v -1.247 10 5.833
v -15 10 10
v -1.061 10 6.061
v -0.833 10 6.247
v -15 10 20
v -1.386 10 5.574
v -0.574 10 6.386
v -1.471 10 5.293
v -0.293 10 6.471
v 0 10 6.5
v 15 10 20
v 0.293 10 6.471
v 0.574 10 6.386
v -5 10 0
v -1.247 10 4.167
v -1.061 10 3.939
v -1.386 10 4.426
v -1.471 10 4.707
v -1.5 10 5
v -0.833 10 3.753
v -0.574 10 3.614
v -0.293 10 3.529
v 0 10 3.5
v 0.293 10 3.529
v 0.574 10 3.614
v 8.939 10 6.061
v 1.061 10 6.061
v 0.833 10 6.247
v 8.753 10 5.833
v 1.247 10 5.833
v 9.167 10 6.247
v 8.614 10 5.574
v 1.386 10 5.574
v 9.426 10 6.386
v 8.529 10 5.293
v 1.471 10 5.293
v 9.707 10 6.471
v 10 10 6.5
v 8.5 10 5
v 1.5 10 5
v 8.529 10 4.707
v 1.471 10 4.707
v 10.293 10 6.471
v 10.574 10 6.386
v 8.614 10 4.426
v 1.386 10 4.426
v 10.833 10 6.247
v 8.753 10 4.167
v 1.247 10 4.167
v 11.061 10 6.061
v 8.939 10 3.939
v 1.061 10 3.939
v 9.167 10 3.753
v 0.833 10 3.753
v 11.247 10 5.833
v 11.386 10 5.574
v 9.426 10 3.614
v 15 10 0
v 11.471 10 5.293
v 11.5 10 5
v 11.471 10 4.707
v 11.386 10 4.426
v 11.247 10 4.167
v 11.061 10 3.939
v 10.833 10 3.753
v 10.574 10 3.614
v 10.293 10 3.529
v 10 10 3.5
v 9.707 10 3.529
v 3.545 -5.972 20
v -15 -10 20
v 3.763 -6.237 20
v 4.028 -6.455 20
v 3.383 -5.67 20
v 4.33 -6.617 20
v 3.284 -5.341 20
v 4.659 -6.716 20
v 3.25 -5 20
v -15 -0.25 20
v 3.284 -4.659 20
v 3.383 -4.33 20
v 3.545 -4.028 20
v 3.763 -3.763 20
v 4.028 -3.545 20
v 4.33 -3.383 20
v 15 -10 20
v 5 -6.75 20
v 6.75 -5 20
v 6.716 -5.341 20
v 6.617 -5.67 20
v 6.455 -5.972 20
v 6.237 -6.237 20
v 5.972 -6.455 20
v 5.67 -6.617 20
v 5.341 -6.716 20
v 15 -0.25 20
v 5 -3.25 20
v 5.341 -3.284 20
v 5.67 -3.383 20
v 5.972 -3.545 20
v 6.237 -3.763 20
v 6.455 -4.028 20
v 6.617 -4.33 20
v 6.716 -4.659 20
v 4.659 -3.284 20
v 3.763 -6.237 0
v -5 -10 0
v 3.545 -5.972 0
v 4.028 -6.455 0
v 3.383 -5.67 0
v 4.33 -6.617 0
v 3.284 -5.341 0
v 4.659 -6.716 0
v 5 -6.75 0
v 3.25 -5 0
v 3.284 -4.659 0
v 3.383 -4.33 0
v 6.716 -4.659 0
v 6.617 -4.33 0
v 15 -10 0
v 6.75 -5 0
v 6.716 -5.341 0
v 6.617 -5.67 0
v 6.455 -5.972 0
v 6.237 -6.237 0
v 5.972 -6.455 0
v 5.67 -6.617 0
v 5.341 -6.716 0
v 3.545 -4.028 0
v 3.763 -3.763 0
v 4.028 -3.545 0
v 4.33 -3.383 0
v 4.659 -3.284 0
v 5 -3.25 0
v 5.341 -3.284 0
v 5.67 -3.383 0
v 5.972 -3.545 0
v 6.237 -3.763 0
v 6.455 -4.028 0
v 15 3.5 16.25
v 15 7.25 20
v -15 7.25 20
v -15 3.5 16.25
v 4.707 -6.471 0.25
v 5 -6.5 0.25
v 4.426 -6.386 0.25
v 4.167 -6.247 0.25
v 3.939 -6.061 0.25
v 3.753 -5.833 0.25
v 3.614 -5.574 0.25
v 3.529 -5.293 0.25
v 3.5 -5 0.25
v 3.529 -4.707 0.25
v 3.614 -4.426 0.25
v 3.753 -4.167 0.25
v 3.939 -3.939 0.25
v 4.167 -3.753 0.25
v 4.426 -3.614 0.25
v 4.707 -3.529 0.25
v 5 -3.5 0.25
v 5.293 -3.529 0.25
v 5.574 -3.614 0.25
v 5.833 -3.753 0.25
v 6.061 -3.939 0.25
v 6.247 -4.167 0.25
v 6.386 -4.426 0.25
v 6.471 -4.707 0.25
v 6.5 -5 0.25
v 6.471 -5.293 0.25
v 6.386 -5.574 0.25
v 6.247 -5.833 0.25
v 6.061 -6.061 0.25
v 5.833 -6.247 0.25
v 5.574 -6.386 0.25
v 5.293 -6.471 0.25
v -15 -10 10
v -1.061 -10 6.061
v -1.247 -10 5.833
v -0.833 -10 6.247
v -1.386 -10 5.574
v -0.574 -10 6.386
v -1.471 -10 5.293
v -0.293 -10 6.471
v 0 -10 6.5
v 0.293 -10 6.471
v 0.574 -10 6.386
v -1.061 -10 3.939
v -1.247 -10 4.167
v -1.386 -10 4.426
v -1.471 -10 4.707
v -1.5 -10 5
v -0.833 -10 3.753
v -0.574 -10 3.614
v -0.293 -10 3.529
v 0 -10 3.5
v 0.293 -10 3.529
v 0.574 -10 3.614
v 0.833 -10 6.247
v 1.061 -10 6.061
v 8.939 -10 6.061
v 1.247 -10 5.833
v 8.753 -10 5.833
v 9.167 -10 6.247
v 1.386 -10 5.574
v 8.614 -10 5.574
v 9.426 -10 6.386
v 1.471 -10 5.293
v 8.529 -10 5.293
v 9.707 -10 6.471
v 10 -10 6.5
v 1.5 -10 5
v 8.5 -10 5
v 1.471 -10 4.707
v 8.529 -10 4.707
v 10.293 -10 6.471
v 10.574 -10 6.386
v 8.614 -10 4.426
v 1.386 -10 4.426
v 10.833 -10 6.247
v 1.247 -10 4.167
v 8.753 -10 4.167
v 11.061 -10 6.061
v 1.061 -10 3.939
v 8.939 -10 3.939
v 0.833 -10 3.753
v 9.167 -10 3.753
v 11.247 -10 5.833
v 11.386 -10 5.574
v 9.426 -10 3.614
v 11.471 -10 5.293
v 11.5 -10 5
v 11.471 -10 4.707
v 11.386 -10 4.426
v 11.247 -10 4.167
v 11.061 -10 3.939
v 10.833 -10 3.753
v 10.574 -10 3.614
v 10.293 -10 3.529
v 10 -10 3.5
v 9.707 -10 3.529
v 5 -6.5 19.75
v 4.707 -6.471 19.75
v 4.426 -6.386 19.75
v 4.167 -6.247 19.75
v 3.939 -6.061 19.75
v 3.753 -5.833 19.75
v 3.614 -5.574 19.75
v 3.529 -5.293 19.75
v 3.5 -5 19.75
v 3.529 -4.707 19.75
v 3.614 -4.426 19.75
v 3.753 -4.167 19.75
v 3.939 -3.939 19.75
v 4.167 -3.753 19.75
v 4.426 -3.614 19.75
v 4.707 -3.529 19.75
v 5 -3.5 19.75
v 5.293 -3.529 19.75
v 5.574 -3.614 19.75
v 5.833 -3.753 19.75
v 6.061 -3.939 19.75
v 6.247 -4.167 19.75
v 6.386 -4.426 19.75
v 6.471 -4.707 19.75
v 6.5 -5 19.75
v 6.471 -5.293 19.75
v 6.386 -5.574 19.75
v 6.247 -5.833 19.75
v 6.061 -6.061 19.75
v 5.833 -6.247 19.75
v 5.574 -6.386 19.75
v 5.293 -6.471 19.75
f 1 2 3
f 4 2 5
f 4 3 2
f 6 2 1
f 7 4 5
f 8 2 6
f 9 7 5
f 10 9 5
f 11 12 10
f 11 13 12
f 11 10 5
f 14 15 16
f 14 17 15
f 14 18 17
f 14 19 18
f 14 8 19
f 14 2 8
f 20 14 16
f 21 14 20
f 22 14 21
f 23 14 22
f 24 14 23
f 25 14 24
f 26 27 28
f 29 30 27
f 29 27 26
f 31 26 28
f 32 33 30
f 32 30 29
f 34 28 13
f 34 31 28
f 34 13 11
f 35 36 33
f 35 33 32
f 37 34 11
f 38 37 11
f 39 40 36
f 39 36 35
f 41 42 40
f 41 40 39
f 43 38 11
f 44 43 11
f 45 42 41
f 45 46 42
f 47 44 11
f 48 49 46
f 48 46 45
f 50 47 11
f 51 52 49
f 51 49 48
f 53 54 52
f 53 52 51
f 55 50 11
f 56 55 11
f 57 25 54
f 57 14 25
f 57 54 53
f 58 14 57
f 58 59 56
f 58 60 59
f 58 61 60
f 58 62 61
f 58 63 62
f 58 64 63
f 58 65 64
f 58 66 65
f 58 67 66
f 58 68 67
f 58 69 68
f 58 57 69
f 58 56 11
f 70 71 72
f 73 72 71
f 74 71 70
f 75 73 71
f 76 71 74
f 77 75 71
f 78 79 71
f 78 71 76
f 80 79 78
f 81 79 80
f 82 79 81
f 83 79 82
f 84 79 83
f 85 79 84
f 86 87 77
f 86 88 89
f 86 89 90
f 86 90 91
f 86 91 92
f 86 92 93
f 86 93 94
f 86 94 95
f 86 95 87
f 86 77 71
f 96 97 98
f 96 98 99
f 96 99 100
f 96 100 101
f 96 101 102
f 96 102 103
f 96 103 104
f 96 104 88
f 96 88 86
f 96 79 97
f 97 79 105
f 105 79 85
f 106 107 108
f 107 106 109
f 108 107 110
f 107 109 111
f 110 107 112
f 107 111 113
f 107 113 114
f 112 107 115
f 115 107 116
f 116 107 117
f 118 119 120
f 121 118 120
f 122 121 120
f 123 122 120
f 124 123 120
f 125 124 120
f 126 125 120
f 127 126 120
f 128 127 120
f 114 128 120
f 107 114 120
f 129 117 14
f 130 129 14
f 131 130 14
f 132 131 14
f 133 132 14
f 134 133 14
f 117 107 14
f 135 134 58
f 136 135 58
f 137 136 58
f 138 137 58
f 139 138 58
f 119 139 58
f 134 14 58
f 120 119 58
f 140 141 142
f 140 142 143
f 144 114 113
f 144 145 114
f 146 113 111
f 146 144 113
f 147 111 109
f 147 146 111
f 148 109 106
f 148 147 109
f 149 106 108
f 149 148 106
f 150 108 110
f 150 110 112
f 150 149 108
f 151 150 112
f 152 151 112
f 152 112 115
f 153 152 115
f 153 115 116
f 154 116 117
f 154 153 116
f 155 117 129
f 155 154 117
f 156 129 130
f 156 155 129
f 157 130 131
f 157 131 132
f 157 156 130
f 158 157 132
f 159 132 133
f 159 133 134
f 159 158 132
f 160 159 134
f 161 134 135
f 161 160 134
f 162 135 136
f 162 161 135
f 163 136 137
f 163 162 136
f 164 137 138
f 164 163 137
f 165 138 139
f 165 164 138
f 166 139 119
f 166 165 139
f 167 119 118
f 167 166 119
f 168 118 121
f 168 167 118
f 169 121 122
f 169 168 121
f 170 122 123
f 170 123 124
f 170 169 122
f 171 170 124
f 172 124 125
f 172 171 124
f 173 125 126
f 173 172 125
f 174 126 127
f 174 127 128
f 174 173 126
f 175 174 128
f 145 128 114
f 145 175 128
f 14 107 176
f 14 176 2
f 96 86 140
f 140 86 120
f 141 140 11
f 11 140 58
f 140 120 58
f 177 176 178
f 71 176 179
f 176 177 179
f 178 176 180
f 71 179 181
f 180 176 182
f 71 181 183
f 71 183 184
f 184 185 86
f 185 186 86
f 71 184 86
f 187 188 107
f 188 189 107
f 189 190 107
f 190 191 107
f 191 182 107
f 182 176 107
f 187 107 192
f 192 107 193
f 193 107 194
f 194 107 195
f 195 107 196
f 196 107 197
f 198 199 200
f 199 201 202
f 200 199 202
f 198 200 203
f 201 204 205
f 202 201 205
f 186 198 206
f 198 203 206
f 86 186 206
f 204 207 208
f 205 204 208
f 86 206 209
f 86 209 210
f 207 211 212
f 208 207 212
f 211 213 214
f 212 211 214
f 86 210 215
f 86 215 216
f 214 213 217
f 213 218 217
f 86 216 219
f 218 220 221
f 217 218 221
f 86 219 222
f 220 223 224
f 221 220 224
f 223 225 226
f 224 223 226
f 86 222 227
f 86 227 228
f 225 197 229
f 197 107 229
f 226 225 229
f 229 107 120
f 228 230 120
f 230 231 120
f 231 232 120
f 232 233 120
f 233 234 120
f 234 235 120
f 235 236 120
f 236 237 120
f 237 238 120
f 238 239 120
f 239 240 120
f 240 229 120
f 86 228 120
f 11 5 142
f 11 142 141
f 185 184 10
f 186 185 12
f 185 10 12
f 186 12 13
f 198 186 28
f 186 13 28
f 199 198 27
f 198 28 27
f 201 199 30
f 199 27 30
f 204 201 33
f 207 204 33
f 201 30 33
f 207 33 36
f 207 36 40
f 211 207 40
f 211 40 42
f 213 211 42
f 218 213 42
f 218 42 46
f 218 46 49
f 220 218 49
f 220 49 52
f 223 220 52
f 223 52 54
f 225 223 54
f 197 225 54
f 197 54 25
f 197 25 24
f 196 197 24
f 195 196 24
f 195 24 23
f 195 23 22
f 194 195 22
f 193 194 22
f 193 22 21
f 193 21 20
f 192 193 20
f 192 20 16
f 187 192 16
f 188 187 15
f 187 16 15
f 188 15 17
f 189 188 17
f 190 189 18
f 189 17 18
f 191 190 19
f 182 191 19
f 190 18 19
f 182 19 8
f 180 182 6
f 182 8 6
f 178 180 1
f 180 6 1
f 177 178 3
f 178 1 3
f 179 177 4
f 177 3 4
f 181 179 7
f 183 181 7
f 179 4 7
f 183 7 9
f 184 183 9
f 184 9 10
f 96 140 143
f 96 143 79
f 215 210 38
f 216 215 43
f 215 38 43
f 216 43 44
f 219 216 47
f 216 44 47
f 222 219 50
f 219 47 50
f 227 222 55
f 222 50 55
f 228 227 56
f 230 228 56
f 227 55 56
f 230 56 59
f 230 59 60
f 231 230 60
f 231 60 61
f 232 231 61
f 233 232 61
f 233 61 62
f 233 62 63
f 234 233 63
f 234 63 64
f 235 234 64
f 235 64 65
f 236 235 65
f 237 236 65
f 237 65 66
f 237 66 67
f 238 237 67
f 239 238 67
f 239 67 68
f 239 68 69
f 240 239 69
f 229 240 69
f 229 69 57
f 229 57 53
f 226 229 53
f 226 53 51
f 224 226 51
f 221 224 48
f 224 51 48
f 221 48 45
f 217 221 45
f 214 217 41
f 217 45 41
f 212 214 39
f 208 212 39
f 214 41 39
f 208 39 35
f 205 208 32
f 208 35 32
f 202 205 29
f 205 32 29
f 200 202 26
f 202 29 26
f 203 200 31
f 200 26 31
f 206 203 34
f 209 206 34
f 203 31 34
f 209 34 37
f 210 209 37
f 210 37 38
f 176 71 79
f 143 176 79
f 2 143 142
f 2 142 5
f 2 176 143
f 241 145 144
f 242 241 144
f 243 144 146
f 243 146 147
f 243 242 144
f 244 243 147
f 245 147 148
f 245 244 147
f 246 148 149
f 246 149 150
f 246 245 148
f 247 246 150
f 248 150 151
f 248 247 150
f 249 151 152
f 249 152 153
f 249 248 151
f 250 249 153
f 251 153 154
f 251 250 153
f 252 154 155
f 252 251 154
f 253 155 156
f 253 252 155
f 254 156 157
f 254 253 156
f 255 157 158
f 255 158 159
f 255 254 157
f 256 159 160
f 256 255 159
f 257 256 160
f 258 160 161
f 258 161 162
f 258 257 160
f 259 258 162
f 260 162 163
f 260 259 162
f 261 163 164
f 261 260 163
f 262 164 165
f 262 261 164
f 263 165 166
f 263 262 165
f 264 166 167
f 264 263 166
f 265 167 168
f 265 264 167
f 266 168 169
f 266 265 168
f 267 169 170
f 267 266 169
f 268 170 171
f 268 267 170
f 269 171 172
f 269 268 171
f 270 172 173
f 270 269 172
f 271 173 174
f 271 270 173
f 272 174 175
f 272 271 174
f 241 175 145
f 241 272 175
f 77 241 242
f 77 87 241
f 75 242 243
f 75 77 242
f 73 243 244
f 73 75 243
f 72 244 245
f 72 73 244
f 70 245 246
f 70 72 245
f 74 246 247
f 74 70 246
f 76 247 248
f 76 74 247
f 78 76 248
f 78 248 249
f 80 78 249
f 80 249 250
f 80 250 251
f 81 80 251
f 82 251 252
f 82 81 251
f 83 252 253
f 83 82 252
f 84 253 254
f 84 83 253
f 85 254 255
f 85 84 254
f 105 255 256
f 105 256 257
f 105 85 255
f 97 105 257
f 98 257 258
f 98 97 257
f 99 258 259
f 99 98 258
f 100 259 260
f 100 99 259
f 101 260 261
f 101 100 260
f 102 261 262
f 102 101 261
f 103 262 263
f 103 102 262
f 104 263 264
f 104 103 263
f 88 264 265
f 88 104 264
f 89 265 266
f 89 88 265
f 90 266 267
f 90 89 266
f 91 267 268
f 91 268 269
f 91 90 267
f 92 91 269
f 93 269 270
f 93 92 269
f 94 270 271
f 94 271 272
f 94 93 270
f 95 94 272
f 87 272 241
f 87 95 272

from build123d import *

# Parameters (mm, degrees)
ESQUISSE1_W           = 30
ESQUISSE1_H           = 20
EXTRUSION1_DEPTH      = 20
EXTRUSION2_DEPTH      = 38.416573868
EXTRUSION2_DEPTH_BACK = 38.416573868
ESQUISSE3_R           = 1.5
EXTRUSION3_DEPTH      = 33.015621187
CHANFREIN1_SIZE       = 10


with BuildPart() as part:
    # Esquisse1 → Extrusion1 (new body)
    with BuildSketch(Plane.XY):
        Rectangle(ESQUISSE1_W, ESQUISSE1_H)
    extrude(amount=EXTRUSION1_DEPTH)

    # Esquisse2 → Extrusion2 (cut, two sides: drawn at the far end of the back side and taken through both)
    with BuildSketch(Plane.ZY.offset(15).offset(-EXTRUSION2_DEPTH_BACK)):
        Polygon((64.422439942, 51.672439942), (20, 7.25), (16.25, 3.5), (20, -0.25), (64.422439942, -44.672439942), (190.068074021, -44.672439942), (190.068074021, 51.672439942), align=None)
    extrude(amount=EXTRUSION2_DEPTH + EXTRUSION2_DEPTH_BACK, mode=Mode.SUBTRACT)

    # Esquisse3 → Extrusion3 (cut, through all)
    with BuildSketch(Plane(origin=(0, 10, 0), x_dir=(1, 0, 0), z_dir=(0, 1, 0))):
        with Locations(Location((10, -5, 0), (0, 0, 270))):
            Circle(ESQUISSE3_R)
        with Locations(Location((0, -5, 0), (0, 0, 270))):
            Circle(ESQUISSE3_R)
    extrude(amount=-EXTRUSION3_DEPTH, mode=Mode.SUBTRACT)

    # Chanfrein1
    chanfrein1_edges = [part.edges().sort_by_distance(p)[0] for p in [
        (-15, 0, 0),
    ]]
    chamfer(chanfrein1_edges, length=CHANFREIN1_SIZE)

    # Esquisse4 → Trou taraudé M31 (revolve, cut)
    with BuildSketch(Plane(origin=(5, -5, 20), x_dir=(0, -1, 0), z_dir=(1, 0, 0))):
        Polygon((0, 0), (0, 20), (1.75, 20), (1.5, 19.75), (1.5, 0.25), (1.75, 0), align=None)
    revolve(axis=Axis((5, -5, 26.35), (0, 0, -1)), mode=Mode.SUBTRACT)


solid = part.part
